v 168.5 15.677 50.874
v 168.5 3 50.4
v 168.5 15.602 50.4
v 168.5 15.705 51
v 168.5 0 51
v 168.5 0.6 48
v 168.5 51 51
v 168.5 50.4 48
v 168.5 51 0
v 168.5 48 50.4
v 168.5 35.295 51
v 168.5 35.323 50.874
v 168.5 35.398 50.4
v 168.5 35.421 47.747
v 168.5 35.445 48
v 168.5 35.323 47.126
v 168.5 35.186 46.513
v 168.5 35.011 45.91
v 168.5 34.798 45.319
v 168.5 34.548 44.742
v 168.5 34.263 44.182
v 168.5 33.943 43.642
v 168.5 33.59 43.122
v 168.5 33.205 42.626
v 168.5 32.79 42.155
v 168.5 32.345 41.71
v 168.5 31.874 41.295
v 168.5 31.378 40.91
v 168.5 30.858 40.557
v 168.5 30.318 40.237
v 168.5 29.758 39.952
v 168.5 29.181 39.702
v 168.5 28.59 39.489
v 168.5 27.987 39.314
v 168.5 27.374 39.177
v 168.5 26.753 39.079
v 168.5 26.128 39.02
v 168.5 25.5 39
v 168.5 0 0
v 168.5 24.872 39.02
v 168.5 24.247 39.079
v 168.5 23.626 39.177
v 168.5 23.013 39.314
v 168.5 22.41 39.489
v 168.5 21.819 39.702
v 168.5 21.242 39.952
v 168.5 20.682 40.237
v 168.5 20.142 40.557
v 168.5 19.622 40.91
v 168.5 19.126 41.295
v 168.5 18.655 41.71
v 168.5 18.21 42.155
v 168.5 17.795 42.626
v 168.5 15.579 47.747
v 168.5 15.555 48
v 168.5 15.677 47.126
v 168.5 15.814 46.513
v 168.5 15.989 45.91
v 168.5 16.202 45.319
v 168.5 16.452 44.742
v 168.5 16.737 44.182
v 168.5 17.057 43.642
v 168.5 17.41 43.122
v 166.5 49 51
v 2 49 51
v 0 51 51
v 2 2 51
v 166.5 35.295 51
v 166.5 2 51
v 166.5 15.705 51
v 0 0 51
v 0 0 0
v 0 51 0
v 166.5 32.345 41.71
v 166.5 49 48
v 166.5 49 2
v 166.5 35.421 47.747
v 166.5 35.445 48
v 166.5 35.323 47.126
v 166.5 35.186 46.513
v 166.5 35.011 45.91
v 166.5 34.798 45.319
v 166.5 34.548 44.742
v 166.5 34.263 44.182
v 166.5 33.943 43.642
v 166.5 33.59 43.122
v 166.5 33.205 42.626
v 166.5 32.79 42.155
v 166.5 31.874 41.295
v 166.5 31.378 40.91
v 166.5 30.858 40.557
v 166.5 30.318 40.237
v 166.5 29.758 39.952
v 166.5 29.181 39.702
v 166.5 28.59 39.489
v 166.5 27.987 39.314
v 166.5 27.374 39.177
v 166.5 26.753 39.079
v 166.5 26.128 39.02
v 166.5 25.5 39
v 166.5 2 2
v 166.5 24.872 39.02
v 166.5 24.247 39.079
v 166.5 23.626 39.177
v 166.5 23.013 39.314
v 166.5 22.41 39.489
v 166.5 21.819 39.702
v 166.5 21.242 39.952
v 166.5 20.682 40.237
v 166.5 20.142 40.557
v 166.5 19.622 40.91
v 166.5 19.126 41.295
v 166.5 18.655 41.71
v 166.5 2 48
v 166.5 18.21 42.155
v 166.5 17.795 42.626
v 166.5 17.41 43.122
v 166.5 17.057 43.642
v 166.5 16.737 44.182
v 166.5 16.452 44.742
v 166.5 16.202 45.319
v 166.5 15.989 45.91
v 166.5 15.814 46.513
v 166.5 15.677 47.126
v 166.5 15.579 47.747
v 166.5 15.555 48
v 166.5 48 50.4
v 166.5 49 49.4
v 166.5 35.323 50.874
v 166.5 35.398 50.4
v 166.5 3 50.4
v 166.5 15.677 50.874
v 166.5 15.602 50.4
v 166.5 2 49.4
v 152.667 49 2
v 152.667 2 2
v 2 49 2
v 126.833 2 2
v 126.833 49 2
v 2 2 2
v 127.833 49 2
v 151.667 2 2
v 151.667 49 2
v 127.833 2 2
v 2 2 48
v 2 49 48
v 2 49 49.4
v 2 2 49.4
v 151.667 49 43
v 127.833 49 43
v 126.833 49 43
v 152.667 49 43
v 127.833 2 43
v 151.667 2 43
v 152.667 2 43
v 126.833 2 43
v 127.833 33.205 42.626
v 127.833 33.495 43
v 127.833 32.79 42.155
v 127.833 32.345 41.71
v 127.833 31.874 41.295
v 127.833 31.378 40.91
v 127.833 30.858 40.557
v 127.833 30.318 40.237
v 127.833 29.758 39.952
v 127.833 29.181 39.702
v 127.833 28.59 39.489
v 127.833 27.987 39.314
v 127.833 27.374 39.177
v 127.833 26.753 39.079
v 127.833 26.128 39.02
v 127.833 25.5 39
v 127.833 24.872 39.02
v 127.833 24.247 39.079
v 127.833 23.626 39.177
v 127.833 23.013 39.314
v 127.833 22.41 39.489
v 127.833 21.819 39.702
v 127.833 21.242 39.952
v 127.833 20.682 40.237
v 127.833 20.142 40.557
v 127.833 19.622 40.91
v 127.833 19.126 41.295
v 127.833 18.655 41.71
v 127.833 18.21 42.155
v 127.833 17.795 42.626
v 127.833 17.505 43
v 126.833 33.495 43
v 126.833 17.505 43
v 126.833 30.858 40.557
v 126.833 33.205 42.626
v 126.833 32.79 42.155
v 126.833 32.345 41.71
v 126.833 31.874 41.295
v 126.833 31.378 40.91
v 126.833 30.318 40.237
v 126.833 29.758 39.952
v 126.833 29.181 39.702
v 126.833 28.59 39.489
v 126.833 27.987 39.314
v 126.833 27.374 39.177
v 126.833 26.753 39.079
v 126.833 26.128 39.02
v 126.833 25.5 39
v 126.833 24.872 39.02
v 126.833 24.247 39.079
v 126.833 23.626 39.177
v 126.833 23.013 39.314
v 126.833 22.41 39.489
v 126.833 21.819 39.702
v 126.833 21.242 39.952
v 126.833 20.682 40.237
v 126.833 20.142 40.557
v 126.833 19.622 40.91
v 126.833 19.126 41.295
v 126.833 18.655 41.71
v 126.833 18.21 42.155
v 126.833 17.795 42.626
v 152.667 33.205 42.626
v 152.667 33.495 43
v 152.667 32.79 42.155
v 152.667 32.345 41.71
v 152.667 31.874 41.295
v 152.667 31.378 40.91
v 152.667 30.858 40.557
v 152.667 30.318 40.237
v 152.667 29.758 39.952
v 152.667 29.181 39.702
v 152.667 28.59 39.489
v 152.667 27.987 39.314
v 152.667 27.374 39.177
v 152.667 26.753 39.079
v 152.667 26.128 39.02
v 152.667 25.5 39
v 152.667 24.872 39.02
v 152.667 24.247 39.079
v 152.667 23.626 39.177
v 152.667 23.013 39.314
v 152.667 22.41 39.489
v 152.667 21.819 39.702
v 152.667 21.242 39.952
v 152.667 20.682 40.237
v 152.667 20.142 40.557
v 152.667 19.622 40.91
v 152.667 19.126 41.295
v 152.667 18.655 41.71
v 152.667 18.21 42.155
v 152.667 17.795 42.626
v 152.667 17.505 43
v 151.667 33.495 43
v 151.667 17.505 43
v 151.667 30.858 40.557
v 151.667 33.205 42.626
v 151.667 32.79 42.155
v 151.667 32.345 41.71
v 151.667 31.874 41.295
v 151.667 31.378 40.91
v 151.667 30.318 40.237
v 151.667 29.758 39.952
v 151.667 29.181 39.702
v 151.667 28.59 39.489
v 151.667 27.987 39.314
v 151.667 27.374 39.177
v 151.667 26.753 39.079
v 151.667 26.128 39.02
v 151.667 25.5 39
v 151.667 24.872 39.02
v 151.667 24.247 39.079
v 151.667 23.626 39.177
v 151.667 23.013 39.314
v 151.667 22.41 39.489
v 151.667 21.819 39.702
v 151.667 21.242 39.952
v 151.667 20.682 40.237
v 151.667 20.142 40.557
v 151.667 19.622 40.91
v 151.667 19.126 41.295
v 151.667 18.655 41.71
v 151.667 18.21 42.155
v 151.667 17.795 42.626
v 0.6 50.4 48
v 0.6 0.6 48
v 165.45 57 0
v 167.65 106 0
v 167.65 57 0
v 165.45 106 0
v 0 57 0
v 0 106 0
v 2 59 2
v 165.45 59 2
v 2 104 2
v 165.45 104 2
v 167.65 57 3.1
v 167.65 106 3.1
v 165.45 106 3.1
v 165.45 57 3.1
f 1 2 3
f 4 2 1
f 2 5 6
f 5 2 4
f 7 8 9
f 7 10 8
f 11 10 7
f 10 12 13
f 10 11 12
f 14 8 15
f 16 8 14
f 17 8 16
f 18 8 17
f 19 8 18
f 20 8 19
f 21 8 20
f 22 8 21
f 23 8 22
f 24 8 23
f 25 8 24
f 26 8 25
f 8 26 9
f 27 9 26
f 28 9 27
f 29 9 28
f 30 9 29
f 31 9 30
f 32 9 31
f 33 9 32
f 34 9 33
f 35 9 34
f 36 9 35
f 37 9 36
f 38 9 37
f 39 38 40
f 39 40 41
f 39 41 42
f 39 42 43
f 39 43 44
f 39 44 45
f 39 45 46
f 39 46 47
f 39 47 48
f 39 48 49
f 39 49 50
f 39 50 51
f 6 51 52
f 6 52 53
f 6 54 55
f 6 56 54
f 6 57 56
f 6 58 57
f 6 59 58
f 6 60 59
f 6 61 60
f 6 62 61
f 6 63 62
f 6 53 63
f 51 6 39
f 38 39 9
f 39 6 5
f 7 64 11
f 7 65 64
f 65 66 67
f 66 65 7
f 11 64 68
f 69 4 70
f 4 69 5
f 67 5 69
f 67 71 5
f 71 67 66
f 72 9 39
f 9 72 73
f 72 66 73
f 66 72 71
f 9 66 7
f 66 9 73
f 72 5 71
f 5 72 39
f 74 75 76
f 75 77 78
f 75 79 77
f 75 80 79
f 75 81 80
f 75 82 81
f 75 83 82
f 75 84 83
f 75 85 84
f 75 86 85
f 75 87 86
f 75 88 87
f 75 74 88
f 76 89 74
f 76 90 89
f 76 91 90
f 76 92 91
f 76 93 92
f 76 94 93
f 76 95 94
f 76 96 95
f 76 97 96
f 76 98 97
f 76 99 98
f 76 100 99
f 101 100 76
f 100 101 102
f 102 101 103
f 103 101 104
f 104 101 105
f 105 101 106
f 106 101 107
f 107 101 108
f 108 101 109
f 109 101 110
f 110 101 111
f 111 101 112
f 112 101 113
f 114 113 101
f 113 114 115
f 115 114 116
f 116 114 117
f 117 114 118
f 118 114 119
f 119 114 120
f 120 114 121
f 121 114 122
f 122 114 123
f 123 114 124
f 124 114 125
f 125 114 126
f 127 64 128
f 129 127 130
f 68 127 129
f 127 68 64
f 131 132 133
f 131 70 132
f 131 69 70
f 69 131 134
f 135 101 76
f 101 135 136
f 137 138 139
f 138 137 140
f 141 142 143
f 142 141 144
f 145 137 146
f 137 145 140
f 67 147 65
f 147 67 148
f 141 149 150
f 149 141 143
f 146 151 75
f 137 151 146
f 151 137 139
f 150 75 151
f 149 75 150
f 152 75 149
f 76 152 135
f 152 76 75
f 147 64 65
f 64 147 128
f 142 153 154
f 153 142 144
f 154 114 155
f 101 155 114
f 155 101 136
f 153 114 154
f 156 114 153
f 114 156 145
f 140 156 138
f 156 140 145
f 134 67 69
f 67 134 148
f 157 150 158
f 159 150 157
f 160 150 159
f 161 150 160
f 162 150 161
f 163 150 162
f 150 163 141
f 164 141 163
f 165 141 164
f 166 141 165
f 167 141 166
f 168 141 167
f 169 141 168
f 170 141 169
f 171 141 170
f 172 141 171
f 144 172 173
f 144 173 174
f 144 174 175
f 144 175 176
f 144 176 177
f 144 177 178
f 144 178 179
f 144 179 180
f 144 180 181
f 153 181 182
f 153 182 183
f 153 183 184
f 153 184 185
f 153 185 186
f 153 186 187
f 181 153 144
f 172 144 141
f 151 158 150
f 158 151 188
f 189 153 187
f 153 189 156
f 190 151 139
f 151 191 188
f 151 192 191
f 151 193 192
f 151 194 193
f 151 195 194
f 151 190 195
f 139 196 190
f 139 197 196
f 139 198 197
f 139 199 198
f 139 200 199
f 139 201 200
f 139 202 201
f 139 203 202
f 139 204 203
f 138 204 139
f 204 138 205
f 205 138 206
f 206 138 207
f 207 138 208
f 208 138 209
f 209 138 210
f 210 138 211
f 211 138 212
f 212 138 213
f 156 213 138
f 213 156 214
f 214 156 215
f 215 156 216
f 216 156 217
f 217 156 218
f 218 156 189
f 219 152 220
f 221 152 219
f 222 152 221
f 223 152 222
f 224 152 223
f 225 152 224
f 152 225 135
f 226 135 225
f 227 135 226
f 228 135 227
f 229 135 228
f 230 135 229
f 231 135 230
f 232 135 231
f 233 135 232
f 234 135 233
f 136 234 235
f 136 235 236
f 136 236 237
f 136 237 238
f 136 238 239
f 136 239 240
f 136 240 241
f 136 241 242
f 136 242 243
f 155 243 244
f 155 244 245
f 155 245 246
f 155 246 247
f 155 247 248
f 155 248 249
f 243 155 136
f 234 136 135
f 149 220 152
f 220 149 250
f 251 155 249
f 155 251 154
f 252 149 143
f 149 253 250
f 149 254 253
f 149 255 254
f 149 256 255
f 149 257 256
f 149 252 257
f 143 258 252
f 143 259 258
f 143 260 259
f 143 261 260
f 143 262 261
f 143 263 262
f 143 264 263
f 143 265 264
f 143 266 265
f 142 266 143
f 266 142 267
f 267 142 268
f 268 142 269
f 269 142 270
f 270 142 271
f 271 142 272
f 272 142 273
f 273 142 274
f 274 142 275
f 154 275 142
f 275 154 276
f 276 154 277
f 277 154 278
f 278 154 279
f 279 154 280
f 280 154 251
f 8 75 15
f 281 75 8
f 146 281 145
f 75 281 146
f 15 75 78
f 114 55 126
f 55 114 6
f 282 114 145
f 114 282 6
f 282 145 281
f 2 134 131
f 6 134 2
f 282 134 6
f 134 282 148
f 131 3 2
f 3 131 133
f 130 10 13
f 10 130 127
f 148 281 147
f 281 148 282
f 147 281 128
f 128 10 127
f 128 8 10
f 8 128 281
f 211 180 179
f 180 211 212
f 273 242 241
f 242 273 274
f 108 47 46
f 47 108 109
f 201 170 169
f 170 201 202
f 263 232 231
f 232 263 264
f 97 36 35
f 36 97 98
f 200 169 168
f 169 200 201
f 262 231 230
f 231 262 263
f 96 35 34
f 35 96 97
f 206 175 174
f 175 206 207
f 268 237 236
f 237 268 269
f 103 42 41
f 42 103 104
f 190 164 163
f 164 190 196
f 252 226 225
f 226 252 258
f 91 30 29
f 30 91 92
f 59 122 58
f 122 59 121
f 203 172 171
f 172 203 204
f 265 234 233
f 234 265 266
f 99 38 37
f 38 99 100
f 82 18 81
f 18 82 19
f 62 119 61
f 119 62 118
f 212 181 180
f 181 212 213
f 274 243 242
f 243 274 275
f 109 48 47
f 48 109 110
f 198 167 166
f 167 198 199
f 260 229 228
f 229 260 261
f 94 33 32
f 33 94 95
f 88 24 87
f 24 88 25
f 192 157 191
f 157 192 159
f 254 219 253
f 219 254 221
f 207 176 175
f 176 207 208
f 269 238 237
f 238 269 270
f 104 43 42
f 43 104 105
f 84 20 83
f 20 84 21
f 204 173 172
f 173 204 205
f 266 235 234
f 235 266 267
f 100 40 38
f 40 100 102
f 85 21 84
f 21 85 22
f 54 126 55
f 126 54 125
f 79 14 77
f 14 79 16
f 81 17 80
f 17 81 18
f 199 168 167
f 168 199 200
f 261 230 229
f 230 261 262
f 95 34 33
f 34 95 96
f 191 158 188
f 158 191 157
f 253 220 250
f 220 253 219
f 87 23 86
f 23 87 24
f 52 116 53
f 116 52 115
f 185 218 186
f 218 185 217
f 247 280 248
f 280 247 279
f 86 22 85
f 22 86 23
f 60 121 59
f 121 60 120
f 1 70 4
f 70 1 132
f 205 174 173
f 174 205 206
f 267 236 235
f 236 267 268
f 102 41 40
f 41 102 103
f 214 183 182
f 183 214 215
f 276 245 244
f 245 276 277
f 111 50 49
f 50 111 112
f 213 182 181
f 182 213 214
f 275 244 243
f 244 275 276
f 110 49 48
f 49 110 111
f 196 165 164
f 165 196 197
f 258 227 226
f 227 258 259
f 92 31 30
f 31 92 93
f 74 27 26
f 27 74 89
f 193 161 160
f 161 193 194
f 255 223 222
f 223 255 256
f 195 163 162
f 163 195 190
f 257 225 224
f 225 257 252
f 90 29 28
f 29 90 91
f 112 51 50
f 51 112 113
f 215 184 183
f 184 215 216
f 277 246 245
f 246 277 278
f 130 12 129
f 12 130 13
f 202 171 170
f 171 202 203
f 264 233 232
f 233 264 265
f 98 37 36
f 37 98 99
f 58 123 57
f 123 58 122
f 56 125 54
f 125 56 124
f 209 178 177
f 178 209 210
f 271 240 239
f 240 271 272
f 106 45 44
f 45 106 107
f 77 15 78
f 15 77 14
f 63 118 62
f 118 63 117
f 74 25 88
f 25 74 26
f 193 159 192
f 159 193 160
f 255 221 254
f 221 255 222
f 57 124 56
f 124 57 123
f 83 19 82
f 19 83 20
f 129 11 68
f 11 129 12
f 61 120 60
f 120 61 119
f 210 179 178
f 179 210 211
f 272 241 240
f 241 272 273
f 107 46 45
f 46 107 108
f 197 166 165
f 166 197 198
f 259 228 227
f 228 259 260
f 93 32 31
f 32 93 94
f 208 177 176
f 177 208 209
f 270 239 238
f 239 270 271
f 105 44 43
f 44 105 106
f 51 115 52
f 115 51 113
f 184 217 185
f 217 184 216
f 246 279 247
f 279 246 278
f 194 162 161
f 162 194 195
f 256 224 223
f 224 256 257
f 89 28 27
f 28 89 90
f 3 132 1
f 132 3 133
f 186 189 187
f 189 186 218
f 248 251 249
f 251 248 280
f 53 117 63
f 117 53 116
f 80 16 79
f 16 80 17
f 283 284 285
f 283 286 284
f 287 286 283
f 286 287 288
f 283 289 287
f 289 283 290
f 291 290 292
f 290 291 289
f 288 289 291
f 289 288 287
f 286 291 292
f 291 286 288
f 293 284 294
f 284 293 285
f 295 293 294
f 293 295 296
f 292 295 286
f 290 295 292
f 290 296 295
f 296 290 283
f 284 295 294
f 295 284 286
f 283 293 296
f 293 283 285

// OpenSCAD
// file: carcassonne_box.scad
/**
 * @file carcassonne_box.scad
 * @author Conlan Wesson (modified by [Your Name])
 * Template for Carcassonne boxes.
 * @copyright Creative Commons Attribution-NonCommercial-ShareAlike 4.0
 */

mm = 1;
cm = 10*mm;

width = 47*mm;
thick = 2.5*mm;
wall = 2*mm;

/**
 * Lid for box.
 * @param sections Array of section lengths.
 * @param columns Number of columns.
 * @param icon Path to icon DXF file.
 * @param rot Icon rotation in degrees.
 * @param mult Icon scale.
 * @param xoff X-offset of icon from center.
 * @param yoff Y-offset of icon from center.
 */
module carcassonne_lid(sections, columns=1, icon=false, icon2=false, icon3=false, rot=0, mult=1, xoff=0, yoff=0, mult2=1, xoff2=0, yoff2=0, mult3=1, xoff3=0, yoff3=0, g=0){
    length = sum(sections) + ((width/2) - (sum(sections) % (width/2)));
    w = length+(1.5*wall)+.1;
    l = (width*columns)+wall;
    h = wall;
    d = 2;

    CubePoints = [
        [ 0-g, 0-g,   0 ],  //0
        [ w+g, 0-g,   0 ],  //1
        [ w+g, l+g,   0 ],  //2
        [ 0-g, l+g,   0 ],  //3
        [   d,   d, h+g ],  //4
        [   w,   d, h+g ],  //5
        [   w, l-d, h+g ],  //6
        [   d, l-d, h+g ]   //7
    ];
    
    CubeFaces = [
        [0,1,2,3],  // bottom
        [4,5,1,0],  // front
        [7,6,5,4],  // top
        [5,6,2,1],  // right
        [6,7,3,2],  // back
        [7,4,0,3]   // left
    ];
    
    difference(){
        union(){
            polyhedron( CubePoints, CubeFaces );
            translate([w-wall-.15,0,0]) cube([wall+.2,l, (1.5*wall)+.1]);
        }
        if(icon){
            translate([w/2+xoff,l/3+yoff,h-(wall/2)]){
                linear_extrude(height=(wall)+.1){
                    rotate(rot) scale(mult) import(icon);
                }
            }
        }
        if(icon2){
            translate([w/2+xoff2,l/3+yoff2,h-(wall/2)]){
                linear_extrude(height=(wall)+.1){
                    rotate(rot) scale(mult2) import(icon2);
                }
            }
        }
        if(icon3){
            translate([w/2+xoff3,l/3+yoff3,h-(wall/2)]){
                linear_extrude(height=(wall)+.1){
                    rotate(rot) scale(mult3) import(icon3);
                }
            }
        }
    }
}

/**
 * Carcassonne card box.
 * @param sections Array of section lengths.
 * @param columns Number of columns.
 */
module carcassonne_box(sections, columns=1){
    raw_length = sum(sections);
    extra_space = ((width/2) - (raw_length % (width/2))) % (width/2);
    length = raw_length + extra_space;
    
    section_count = len(sections);
    adjusted_sections = [for (i = [0:section_count-1]) 
        sections[i] + (extra_space / section_count)];
    
    difference(){
        union(){
            difference(){
                // Outer walls
                cube([length+(2*wall), (width*columns)+(2*wall), width+(2*wall)]);
                // Cavity
                translate([wall, wall, wall]){
                    cube([length, width*columns, (width+wall)+.1]);
                }
            }
            // Dividers
            for(col = [0:columns-1]){
                divider_positions = [for(i=0; i<len(adjusted_sections)-1; i=i+1) 
                    sum([for(j=[0:i]) adjusted_sections[j]])];
                for(pos = divider_positions){
                    translate([pos+wall, width*col+wall, 0]) 
                        cube([wall/2, width, width-(2*wall)]);
                }
                if(col > 0){
                    translate([0, width*col+(wall/2), 0]) 
                        cube([length+(2*wall)-18.0, wall/2, width-(2*wall)]);
                }
            }
        }
        union(){
            // Notch
            for(col = [0:columns-1]){
                translate([wall, wall+(width*col), wall]){
                    translate([0, width/2, width])
                    rotate([0, 90, 0]){
                        cylinder(r=10, h=length+(2*wall), $fn=100);
                    }
                }
            }
            // Track
            translate([wall/2,wall/2,width+wall/2]) 
                carcassonne_lid(adjusted_sections, columns, g=0.4);
        }
    }
}

// Helper function to sum an array
function sum(v, i = 0, r = 0) = i < len(v) ? sum(v, i + 1, r + v[i]) : r;
// main file
/**
 * @file mists.scad
 * @author Andrew Hargrave
 * Mists Over Carcossonne box.
 * @copyright Creative Commons Attribution-NonCommercial-ShareAlike 4.0
 */

include <carcassonne_box.scad>

mm = 1;
tiles = 2*mm;

sections = [60*tiles, 20*mm, 10*mm];
columns = 1; 
icon="11-mists.dxf";

carcassonne_box(sections, columns);
translate([0,width*columns+10,0]) carcassonne_lid(sections, columns, icon, rot=90, mult=2.2, xoff=21, yoff=-9); 
